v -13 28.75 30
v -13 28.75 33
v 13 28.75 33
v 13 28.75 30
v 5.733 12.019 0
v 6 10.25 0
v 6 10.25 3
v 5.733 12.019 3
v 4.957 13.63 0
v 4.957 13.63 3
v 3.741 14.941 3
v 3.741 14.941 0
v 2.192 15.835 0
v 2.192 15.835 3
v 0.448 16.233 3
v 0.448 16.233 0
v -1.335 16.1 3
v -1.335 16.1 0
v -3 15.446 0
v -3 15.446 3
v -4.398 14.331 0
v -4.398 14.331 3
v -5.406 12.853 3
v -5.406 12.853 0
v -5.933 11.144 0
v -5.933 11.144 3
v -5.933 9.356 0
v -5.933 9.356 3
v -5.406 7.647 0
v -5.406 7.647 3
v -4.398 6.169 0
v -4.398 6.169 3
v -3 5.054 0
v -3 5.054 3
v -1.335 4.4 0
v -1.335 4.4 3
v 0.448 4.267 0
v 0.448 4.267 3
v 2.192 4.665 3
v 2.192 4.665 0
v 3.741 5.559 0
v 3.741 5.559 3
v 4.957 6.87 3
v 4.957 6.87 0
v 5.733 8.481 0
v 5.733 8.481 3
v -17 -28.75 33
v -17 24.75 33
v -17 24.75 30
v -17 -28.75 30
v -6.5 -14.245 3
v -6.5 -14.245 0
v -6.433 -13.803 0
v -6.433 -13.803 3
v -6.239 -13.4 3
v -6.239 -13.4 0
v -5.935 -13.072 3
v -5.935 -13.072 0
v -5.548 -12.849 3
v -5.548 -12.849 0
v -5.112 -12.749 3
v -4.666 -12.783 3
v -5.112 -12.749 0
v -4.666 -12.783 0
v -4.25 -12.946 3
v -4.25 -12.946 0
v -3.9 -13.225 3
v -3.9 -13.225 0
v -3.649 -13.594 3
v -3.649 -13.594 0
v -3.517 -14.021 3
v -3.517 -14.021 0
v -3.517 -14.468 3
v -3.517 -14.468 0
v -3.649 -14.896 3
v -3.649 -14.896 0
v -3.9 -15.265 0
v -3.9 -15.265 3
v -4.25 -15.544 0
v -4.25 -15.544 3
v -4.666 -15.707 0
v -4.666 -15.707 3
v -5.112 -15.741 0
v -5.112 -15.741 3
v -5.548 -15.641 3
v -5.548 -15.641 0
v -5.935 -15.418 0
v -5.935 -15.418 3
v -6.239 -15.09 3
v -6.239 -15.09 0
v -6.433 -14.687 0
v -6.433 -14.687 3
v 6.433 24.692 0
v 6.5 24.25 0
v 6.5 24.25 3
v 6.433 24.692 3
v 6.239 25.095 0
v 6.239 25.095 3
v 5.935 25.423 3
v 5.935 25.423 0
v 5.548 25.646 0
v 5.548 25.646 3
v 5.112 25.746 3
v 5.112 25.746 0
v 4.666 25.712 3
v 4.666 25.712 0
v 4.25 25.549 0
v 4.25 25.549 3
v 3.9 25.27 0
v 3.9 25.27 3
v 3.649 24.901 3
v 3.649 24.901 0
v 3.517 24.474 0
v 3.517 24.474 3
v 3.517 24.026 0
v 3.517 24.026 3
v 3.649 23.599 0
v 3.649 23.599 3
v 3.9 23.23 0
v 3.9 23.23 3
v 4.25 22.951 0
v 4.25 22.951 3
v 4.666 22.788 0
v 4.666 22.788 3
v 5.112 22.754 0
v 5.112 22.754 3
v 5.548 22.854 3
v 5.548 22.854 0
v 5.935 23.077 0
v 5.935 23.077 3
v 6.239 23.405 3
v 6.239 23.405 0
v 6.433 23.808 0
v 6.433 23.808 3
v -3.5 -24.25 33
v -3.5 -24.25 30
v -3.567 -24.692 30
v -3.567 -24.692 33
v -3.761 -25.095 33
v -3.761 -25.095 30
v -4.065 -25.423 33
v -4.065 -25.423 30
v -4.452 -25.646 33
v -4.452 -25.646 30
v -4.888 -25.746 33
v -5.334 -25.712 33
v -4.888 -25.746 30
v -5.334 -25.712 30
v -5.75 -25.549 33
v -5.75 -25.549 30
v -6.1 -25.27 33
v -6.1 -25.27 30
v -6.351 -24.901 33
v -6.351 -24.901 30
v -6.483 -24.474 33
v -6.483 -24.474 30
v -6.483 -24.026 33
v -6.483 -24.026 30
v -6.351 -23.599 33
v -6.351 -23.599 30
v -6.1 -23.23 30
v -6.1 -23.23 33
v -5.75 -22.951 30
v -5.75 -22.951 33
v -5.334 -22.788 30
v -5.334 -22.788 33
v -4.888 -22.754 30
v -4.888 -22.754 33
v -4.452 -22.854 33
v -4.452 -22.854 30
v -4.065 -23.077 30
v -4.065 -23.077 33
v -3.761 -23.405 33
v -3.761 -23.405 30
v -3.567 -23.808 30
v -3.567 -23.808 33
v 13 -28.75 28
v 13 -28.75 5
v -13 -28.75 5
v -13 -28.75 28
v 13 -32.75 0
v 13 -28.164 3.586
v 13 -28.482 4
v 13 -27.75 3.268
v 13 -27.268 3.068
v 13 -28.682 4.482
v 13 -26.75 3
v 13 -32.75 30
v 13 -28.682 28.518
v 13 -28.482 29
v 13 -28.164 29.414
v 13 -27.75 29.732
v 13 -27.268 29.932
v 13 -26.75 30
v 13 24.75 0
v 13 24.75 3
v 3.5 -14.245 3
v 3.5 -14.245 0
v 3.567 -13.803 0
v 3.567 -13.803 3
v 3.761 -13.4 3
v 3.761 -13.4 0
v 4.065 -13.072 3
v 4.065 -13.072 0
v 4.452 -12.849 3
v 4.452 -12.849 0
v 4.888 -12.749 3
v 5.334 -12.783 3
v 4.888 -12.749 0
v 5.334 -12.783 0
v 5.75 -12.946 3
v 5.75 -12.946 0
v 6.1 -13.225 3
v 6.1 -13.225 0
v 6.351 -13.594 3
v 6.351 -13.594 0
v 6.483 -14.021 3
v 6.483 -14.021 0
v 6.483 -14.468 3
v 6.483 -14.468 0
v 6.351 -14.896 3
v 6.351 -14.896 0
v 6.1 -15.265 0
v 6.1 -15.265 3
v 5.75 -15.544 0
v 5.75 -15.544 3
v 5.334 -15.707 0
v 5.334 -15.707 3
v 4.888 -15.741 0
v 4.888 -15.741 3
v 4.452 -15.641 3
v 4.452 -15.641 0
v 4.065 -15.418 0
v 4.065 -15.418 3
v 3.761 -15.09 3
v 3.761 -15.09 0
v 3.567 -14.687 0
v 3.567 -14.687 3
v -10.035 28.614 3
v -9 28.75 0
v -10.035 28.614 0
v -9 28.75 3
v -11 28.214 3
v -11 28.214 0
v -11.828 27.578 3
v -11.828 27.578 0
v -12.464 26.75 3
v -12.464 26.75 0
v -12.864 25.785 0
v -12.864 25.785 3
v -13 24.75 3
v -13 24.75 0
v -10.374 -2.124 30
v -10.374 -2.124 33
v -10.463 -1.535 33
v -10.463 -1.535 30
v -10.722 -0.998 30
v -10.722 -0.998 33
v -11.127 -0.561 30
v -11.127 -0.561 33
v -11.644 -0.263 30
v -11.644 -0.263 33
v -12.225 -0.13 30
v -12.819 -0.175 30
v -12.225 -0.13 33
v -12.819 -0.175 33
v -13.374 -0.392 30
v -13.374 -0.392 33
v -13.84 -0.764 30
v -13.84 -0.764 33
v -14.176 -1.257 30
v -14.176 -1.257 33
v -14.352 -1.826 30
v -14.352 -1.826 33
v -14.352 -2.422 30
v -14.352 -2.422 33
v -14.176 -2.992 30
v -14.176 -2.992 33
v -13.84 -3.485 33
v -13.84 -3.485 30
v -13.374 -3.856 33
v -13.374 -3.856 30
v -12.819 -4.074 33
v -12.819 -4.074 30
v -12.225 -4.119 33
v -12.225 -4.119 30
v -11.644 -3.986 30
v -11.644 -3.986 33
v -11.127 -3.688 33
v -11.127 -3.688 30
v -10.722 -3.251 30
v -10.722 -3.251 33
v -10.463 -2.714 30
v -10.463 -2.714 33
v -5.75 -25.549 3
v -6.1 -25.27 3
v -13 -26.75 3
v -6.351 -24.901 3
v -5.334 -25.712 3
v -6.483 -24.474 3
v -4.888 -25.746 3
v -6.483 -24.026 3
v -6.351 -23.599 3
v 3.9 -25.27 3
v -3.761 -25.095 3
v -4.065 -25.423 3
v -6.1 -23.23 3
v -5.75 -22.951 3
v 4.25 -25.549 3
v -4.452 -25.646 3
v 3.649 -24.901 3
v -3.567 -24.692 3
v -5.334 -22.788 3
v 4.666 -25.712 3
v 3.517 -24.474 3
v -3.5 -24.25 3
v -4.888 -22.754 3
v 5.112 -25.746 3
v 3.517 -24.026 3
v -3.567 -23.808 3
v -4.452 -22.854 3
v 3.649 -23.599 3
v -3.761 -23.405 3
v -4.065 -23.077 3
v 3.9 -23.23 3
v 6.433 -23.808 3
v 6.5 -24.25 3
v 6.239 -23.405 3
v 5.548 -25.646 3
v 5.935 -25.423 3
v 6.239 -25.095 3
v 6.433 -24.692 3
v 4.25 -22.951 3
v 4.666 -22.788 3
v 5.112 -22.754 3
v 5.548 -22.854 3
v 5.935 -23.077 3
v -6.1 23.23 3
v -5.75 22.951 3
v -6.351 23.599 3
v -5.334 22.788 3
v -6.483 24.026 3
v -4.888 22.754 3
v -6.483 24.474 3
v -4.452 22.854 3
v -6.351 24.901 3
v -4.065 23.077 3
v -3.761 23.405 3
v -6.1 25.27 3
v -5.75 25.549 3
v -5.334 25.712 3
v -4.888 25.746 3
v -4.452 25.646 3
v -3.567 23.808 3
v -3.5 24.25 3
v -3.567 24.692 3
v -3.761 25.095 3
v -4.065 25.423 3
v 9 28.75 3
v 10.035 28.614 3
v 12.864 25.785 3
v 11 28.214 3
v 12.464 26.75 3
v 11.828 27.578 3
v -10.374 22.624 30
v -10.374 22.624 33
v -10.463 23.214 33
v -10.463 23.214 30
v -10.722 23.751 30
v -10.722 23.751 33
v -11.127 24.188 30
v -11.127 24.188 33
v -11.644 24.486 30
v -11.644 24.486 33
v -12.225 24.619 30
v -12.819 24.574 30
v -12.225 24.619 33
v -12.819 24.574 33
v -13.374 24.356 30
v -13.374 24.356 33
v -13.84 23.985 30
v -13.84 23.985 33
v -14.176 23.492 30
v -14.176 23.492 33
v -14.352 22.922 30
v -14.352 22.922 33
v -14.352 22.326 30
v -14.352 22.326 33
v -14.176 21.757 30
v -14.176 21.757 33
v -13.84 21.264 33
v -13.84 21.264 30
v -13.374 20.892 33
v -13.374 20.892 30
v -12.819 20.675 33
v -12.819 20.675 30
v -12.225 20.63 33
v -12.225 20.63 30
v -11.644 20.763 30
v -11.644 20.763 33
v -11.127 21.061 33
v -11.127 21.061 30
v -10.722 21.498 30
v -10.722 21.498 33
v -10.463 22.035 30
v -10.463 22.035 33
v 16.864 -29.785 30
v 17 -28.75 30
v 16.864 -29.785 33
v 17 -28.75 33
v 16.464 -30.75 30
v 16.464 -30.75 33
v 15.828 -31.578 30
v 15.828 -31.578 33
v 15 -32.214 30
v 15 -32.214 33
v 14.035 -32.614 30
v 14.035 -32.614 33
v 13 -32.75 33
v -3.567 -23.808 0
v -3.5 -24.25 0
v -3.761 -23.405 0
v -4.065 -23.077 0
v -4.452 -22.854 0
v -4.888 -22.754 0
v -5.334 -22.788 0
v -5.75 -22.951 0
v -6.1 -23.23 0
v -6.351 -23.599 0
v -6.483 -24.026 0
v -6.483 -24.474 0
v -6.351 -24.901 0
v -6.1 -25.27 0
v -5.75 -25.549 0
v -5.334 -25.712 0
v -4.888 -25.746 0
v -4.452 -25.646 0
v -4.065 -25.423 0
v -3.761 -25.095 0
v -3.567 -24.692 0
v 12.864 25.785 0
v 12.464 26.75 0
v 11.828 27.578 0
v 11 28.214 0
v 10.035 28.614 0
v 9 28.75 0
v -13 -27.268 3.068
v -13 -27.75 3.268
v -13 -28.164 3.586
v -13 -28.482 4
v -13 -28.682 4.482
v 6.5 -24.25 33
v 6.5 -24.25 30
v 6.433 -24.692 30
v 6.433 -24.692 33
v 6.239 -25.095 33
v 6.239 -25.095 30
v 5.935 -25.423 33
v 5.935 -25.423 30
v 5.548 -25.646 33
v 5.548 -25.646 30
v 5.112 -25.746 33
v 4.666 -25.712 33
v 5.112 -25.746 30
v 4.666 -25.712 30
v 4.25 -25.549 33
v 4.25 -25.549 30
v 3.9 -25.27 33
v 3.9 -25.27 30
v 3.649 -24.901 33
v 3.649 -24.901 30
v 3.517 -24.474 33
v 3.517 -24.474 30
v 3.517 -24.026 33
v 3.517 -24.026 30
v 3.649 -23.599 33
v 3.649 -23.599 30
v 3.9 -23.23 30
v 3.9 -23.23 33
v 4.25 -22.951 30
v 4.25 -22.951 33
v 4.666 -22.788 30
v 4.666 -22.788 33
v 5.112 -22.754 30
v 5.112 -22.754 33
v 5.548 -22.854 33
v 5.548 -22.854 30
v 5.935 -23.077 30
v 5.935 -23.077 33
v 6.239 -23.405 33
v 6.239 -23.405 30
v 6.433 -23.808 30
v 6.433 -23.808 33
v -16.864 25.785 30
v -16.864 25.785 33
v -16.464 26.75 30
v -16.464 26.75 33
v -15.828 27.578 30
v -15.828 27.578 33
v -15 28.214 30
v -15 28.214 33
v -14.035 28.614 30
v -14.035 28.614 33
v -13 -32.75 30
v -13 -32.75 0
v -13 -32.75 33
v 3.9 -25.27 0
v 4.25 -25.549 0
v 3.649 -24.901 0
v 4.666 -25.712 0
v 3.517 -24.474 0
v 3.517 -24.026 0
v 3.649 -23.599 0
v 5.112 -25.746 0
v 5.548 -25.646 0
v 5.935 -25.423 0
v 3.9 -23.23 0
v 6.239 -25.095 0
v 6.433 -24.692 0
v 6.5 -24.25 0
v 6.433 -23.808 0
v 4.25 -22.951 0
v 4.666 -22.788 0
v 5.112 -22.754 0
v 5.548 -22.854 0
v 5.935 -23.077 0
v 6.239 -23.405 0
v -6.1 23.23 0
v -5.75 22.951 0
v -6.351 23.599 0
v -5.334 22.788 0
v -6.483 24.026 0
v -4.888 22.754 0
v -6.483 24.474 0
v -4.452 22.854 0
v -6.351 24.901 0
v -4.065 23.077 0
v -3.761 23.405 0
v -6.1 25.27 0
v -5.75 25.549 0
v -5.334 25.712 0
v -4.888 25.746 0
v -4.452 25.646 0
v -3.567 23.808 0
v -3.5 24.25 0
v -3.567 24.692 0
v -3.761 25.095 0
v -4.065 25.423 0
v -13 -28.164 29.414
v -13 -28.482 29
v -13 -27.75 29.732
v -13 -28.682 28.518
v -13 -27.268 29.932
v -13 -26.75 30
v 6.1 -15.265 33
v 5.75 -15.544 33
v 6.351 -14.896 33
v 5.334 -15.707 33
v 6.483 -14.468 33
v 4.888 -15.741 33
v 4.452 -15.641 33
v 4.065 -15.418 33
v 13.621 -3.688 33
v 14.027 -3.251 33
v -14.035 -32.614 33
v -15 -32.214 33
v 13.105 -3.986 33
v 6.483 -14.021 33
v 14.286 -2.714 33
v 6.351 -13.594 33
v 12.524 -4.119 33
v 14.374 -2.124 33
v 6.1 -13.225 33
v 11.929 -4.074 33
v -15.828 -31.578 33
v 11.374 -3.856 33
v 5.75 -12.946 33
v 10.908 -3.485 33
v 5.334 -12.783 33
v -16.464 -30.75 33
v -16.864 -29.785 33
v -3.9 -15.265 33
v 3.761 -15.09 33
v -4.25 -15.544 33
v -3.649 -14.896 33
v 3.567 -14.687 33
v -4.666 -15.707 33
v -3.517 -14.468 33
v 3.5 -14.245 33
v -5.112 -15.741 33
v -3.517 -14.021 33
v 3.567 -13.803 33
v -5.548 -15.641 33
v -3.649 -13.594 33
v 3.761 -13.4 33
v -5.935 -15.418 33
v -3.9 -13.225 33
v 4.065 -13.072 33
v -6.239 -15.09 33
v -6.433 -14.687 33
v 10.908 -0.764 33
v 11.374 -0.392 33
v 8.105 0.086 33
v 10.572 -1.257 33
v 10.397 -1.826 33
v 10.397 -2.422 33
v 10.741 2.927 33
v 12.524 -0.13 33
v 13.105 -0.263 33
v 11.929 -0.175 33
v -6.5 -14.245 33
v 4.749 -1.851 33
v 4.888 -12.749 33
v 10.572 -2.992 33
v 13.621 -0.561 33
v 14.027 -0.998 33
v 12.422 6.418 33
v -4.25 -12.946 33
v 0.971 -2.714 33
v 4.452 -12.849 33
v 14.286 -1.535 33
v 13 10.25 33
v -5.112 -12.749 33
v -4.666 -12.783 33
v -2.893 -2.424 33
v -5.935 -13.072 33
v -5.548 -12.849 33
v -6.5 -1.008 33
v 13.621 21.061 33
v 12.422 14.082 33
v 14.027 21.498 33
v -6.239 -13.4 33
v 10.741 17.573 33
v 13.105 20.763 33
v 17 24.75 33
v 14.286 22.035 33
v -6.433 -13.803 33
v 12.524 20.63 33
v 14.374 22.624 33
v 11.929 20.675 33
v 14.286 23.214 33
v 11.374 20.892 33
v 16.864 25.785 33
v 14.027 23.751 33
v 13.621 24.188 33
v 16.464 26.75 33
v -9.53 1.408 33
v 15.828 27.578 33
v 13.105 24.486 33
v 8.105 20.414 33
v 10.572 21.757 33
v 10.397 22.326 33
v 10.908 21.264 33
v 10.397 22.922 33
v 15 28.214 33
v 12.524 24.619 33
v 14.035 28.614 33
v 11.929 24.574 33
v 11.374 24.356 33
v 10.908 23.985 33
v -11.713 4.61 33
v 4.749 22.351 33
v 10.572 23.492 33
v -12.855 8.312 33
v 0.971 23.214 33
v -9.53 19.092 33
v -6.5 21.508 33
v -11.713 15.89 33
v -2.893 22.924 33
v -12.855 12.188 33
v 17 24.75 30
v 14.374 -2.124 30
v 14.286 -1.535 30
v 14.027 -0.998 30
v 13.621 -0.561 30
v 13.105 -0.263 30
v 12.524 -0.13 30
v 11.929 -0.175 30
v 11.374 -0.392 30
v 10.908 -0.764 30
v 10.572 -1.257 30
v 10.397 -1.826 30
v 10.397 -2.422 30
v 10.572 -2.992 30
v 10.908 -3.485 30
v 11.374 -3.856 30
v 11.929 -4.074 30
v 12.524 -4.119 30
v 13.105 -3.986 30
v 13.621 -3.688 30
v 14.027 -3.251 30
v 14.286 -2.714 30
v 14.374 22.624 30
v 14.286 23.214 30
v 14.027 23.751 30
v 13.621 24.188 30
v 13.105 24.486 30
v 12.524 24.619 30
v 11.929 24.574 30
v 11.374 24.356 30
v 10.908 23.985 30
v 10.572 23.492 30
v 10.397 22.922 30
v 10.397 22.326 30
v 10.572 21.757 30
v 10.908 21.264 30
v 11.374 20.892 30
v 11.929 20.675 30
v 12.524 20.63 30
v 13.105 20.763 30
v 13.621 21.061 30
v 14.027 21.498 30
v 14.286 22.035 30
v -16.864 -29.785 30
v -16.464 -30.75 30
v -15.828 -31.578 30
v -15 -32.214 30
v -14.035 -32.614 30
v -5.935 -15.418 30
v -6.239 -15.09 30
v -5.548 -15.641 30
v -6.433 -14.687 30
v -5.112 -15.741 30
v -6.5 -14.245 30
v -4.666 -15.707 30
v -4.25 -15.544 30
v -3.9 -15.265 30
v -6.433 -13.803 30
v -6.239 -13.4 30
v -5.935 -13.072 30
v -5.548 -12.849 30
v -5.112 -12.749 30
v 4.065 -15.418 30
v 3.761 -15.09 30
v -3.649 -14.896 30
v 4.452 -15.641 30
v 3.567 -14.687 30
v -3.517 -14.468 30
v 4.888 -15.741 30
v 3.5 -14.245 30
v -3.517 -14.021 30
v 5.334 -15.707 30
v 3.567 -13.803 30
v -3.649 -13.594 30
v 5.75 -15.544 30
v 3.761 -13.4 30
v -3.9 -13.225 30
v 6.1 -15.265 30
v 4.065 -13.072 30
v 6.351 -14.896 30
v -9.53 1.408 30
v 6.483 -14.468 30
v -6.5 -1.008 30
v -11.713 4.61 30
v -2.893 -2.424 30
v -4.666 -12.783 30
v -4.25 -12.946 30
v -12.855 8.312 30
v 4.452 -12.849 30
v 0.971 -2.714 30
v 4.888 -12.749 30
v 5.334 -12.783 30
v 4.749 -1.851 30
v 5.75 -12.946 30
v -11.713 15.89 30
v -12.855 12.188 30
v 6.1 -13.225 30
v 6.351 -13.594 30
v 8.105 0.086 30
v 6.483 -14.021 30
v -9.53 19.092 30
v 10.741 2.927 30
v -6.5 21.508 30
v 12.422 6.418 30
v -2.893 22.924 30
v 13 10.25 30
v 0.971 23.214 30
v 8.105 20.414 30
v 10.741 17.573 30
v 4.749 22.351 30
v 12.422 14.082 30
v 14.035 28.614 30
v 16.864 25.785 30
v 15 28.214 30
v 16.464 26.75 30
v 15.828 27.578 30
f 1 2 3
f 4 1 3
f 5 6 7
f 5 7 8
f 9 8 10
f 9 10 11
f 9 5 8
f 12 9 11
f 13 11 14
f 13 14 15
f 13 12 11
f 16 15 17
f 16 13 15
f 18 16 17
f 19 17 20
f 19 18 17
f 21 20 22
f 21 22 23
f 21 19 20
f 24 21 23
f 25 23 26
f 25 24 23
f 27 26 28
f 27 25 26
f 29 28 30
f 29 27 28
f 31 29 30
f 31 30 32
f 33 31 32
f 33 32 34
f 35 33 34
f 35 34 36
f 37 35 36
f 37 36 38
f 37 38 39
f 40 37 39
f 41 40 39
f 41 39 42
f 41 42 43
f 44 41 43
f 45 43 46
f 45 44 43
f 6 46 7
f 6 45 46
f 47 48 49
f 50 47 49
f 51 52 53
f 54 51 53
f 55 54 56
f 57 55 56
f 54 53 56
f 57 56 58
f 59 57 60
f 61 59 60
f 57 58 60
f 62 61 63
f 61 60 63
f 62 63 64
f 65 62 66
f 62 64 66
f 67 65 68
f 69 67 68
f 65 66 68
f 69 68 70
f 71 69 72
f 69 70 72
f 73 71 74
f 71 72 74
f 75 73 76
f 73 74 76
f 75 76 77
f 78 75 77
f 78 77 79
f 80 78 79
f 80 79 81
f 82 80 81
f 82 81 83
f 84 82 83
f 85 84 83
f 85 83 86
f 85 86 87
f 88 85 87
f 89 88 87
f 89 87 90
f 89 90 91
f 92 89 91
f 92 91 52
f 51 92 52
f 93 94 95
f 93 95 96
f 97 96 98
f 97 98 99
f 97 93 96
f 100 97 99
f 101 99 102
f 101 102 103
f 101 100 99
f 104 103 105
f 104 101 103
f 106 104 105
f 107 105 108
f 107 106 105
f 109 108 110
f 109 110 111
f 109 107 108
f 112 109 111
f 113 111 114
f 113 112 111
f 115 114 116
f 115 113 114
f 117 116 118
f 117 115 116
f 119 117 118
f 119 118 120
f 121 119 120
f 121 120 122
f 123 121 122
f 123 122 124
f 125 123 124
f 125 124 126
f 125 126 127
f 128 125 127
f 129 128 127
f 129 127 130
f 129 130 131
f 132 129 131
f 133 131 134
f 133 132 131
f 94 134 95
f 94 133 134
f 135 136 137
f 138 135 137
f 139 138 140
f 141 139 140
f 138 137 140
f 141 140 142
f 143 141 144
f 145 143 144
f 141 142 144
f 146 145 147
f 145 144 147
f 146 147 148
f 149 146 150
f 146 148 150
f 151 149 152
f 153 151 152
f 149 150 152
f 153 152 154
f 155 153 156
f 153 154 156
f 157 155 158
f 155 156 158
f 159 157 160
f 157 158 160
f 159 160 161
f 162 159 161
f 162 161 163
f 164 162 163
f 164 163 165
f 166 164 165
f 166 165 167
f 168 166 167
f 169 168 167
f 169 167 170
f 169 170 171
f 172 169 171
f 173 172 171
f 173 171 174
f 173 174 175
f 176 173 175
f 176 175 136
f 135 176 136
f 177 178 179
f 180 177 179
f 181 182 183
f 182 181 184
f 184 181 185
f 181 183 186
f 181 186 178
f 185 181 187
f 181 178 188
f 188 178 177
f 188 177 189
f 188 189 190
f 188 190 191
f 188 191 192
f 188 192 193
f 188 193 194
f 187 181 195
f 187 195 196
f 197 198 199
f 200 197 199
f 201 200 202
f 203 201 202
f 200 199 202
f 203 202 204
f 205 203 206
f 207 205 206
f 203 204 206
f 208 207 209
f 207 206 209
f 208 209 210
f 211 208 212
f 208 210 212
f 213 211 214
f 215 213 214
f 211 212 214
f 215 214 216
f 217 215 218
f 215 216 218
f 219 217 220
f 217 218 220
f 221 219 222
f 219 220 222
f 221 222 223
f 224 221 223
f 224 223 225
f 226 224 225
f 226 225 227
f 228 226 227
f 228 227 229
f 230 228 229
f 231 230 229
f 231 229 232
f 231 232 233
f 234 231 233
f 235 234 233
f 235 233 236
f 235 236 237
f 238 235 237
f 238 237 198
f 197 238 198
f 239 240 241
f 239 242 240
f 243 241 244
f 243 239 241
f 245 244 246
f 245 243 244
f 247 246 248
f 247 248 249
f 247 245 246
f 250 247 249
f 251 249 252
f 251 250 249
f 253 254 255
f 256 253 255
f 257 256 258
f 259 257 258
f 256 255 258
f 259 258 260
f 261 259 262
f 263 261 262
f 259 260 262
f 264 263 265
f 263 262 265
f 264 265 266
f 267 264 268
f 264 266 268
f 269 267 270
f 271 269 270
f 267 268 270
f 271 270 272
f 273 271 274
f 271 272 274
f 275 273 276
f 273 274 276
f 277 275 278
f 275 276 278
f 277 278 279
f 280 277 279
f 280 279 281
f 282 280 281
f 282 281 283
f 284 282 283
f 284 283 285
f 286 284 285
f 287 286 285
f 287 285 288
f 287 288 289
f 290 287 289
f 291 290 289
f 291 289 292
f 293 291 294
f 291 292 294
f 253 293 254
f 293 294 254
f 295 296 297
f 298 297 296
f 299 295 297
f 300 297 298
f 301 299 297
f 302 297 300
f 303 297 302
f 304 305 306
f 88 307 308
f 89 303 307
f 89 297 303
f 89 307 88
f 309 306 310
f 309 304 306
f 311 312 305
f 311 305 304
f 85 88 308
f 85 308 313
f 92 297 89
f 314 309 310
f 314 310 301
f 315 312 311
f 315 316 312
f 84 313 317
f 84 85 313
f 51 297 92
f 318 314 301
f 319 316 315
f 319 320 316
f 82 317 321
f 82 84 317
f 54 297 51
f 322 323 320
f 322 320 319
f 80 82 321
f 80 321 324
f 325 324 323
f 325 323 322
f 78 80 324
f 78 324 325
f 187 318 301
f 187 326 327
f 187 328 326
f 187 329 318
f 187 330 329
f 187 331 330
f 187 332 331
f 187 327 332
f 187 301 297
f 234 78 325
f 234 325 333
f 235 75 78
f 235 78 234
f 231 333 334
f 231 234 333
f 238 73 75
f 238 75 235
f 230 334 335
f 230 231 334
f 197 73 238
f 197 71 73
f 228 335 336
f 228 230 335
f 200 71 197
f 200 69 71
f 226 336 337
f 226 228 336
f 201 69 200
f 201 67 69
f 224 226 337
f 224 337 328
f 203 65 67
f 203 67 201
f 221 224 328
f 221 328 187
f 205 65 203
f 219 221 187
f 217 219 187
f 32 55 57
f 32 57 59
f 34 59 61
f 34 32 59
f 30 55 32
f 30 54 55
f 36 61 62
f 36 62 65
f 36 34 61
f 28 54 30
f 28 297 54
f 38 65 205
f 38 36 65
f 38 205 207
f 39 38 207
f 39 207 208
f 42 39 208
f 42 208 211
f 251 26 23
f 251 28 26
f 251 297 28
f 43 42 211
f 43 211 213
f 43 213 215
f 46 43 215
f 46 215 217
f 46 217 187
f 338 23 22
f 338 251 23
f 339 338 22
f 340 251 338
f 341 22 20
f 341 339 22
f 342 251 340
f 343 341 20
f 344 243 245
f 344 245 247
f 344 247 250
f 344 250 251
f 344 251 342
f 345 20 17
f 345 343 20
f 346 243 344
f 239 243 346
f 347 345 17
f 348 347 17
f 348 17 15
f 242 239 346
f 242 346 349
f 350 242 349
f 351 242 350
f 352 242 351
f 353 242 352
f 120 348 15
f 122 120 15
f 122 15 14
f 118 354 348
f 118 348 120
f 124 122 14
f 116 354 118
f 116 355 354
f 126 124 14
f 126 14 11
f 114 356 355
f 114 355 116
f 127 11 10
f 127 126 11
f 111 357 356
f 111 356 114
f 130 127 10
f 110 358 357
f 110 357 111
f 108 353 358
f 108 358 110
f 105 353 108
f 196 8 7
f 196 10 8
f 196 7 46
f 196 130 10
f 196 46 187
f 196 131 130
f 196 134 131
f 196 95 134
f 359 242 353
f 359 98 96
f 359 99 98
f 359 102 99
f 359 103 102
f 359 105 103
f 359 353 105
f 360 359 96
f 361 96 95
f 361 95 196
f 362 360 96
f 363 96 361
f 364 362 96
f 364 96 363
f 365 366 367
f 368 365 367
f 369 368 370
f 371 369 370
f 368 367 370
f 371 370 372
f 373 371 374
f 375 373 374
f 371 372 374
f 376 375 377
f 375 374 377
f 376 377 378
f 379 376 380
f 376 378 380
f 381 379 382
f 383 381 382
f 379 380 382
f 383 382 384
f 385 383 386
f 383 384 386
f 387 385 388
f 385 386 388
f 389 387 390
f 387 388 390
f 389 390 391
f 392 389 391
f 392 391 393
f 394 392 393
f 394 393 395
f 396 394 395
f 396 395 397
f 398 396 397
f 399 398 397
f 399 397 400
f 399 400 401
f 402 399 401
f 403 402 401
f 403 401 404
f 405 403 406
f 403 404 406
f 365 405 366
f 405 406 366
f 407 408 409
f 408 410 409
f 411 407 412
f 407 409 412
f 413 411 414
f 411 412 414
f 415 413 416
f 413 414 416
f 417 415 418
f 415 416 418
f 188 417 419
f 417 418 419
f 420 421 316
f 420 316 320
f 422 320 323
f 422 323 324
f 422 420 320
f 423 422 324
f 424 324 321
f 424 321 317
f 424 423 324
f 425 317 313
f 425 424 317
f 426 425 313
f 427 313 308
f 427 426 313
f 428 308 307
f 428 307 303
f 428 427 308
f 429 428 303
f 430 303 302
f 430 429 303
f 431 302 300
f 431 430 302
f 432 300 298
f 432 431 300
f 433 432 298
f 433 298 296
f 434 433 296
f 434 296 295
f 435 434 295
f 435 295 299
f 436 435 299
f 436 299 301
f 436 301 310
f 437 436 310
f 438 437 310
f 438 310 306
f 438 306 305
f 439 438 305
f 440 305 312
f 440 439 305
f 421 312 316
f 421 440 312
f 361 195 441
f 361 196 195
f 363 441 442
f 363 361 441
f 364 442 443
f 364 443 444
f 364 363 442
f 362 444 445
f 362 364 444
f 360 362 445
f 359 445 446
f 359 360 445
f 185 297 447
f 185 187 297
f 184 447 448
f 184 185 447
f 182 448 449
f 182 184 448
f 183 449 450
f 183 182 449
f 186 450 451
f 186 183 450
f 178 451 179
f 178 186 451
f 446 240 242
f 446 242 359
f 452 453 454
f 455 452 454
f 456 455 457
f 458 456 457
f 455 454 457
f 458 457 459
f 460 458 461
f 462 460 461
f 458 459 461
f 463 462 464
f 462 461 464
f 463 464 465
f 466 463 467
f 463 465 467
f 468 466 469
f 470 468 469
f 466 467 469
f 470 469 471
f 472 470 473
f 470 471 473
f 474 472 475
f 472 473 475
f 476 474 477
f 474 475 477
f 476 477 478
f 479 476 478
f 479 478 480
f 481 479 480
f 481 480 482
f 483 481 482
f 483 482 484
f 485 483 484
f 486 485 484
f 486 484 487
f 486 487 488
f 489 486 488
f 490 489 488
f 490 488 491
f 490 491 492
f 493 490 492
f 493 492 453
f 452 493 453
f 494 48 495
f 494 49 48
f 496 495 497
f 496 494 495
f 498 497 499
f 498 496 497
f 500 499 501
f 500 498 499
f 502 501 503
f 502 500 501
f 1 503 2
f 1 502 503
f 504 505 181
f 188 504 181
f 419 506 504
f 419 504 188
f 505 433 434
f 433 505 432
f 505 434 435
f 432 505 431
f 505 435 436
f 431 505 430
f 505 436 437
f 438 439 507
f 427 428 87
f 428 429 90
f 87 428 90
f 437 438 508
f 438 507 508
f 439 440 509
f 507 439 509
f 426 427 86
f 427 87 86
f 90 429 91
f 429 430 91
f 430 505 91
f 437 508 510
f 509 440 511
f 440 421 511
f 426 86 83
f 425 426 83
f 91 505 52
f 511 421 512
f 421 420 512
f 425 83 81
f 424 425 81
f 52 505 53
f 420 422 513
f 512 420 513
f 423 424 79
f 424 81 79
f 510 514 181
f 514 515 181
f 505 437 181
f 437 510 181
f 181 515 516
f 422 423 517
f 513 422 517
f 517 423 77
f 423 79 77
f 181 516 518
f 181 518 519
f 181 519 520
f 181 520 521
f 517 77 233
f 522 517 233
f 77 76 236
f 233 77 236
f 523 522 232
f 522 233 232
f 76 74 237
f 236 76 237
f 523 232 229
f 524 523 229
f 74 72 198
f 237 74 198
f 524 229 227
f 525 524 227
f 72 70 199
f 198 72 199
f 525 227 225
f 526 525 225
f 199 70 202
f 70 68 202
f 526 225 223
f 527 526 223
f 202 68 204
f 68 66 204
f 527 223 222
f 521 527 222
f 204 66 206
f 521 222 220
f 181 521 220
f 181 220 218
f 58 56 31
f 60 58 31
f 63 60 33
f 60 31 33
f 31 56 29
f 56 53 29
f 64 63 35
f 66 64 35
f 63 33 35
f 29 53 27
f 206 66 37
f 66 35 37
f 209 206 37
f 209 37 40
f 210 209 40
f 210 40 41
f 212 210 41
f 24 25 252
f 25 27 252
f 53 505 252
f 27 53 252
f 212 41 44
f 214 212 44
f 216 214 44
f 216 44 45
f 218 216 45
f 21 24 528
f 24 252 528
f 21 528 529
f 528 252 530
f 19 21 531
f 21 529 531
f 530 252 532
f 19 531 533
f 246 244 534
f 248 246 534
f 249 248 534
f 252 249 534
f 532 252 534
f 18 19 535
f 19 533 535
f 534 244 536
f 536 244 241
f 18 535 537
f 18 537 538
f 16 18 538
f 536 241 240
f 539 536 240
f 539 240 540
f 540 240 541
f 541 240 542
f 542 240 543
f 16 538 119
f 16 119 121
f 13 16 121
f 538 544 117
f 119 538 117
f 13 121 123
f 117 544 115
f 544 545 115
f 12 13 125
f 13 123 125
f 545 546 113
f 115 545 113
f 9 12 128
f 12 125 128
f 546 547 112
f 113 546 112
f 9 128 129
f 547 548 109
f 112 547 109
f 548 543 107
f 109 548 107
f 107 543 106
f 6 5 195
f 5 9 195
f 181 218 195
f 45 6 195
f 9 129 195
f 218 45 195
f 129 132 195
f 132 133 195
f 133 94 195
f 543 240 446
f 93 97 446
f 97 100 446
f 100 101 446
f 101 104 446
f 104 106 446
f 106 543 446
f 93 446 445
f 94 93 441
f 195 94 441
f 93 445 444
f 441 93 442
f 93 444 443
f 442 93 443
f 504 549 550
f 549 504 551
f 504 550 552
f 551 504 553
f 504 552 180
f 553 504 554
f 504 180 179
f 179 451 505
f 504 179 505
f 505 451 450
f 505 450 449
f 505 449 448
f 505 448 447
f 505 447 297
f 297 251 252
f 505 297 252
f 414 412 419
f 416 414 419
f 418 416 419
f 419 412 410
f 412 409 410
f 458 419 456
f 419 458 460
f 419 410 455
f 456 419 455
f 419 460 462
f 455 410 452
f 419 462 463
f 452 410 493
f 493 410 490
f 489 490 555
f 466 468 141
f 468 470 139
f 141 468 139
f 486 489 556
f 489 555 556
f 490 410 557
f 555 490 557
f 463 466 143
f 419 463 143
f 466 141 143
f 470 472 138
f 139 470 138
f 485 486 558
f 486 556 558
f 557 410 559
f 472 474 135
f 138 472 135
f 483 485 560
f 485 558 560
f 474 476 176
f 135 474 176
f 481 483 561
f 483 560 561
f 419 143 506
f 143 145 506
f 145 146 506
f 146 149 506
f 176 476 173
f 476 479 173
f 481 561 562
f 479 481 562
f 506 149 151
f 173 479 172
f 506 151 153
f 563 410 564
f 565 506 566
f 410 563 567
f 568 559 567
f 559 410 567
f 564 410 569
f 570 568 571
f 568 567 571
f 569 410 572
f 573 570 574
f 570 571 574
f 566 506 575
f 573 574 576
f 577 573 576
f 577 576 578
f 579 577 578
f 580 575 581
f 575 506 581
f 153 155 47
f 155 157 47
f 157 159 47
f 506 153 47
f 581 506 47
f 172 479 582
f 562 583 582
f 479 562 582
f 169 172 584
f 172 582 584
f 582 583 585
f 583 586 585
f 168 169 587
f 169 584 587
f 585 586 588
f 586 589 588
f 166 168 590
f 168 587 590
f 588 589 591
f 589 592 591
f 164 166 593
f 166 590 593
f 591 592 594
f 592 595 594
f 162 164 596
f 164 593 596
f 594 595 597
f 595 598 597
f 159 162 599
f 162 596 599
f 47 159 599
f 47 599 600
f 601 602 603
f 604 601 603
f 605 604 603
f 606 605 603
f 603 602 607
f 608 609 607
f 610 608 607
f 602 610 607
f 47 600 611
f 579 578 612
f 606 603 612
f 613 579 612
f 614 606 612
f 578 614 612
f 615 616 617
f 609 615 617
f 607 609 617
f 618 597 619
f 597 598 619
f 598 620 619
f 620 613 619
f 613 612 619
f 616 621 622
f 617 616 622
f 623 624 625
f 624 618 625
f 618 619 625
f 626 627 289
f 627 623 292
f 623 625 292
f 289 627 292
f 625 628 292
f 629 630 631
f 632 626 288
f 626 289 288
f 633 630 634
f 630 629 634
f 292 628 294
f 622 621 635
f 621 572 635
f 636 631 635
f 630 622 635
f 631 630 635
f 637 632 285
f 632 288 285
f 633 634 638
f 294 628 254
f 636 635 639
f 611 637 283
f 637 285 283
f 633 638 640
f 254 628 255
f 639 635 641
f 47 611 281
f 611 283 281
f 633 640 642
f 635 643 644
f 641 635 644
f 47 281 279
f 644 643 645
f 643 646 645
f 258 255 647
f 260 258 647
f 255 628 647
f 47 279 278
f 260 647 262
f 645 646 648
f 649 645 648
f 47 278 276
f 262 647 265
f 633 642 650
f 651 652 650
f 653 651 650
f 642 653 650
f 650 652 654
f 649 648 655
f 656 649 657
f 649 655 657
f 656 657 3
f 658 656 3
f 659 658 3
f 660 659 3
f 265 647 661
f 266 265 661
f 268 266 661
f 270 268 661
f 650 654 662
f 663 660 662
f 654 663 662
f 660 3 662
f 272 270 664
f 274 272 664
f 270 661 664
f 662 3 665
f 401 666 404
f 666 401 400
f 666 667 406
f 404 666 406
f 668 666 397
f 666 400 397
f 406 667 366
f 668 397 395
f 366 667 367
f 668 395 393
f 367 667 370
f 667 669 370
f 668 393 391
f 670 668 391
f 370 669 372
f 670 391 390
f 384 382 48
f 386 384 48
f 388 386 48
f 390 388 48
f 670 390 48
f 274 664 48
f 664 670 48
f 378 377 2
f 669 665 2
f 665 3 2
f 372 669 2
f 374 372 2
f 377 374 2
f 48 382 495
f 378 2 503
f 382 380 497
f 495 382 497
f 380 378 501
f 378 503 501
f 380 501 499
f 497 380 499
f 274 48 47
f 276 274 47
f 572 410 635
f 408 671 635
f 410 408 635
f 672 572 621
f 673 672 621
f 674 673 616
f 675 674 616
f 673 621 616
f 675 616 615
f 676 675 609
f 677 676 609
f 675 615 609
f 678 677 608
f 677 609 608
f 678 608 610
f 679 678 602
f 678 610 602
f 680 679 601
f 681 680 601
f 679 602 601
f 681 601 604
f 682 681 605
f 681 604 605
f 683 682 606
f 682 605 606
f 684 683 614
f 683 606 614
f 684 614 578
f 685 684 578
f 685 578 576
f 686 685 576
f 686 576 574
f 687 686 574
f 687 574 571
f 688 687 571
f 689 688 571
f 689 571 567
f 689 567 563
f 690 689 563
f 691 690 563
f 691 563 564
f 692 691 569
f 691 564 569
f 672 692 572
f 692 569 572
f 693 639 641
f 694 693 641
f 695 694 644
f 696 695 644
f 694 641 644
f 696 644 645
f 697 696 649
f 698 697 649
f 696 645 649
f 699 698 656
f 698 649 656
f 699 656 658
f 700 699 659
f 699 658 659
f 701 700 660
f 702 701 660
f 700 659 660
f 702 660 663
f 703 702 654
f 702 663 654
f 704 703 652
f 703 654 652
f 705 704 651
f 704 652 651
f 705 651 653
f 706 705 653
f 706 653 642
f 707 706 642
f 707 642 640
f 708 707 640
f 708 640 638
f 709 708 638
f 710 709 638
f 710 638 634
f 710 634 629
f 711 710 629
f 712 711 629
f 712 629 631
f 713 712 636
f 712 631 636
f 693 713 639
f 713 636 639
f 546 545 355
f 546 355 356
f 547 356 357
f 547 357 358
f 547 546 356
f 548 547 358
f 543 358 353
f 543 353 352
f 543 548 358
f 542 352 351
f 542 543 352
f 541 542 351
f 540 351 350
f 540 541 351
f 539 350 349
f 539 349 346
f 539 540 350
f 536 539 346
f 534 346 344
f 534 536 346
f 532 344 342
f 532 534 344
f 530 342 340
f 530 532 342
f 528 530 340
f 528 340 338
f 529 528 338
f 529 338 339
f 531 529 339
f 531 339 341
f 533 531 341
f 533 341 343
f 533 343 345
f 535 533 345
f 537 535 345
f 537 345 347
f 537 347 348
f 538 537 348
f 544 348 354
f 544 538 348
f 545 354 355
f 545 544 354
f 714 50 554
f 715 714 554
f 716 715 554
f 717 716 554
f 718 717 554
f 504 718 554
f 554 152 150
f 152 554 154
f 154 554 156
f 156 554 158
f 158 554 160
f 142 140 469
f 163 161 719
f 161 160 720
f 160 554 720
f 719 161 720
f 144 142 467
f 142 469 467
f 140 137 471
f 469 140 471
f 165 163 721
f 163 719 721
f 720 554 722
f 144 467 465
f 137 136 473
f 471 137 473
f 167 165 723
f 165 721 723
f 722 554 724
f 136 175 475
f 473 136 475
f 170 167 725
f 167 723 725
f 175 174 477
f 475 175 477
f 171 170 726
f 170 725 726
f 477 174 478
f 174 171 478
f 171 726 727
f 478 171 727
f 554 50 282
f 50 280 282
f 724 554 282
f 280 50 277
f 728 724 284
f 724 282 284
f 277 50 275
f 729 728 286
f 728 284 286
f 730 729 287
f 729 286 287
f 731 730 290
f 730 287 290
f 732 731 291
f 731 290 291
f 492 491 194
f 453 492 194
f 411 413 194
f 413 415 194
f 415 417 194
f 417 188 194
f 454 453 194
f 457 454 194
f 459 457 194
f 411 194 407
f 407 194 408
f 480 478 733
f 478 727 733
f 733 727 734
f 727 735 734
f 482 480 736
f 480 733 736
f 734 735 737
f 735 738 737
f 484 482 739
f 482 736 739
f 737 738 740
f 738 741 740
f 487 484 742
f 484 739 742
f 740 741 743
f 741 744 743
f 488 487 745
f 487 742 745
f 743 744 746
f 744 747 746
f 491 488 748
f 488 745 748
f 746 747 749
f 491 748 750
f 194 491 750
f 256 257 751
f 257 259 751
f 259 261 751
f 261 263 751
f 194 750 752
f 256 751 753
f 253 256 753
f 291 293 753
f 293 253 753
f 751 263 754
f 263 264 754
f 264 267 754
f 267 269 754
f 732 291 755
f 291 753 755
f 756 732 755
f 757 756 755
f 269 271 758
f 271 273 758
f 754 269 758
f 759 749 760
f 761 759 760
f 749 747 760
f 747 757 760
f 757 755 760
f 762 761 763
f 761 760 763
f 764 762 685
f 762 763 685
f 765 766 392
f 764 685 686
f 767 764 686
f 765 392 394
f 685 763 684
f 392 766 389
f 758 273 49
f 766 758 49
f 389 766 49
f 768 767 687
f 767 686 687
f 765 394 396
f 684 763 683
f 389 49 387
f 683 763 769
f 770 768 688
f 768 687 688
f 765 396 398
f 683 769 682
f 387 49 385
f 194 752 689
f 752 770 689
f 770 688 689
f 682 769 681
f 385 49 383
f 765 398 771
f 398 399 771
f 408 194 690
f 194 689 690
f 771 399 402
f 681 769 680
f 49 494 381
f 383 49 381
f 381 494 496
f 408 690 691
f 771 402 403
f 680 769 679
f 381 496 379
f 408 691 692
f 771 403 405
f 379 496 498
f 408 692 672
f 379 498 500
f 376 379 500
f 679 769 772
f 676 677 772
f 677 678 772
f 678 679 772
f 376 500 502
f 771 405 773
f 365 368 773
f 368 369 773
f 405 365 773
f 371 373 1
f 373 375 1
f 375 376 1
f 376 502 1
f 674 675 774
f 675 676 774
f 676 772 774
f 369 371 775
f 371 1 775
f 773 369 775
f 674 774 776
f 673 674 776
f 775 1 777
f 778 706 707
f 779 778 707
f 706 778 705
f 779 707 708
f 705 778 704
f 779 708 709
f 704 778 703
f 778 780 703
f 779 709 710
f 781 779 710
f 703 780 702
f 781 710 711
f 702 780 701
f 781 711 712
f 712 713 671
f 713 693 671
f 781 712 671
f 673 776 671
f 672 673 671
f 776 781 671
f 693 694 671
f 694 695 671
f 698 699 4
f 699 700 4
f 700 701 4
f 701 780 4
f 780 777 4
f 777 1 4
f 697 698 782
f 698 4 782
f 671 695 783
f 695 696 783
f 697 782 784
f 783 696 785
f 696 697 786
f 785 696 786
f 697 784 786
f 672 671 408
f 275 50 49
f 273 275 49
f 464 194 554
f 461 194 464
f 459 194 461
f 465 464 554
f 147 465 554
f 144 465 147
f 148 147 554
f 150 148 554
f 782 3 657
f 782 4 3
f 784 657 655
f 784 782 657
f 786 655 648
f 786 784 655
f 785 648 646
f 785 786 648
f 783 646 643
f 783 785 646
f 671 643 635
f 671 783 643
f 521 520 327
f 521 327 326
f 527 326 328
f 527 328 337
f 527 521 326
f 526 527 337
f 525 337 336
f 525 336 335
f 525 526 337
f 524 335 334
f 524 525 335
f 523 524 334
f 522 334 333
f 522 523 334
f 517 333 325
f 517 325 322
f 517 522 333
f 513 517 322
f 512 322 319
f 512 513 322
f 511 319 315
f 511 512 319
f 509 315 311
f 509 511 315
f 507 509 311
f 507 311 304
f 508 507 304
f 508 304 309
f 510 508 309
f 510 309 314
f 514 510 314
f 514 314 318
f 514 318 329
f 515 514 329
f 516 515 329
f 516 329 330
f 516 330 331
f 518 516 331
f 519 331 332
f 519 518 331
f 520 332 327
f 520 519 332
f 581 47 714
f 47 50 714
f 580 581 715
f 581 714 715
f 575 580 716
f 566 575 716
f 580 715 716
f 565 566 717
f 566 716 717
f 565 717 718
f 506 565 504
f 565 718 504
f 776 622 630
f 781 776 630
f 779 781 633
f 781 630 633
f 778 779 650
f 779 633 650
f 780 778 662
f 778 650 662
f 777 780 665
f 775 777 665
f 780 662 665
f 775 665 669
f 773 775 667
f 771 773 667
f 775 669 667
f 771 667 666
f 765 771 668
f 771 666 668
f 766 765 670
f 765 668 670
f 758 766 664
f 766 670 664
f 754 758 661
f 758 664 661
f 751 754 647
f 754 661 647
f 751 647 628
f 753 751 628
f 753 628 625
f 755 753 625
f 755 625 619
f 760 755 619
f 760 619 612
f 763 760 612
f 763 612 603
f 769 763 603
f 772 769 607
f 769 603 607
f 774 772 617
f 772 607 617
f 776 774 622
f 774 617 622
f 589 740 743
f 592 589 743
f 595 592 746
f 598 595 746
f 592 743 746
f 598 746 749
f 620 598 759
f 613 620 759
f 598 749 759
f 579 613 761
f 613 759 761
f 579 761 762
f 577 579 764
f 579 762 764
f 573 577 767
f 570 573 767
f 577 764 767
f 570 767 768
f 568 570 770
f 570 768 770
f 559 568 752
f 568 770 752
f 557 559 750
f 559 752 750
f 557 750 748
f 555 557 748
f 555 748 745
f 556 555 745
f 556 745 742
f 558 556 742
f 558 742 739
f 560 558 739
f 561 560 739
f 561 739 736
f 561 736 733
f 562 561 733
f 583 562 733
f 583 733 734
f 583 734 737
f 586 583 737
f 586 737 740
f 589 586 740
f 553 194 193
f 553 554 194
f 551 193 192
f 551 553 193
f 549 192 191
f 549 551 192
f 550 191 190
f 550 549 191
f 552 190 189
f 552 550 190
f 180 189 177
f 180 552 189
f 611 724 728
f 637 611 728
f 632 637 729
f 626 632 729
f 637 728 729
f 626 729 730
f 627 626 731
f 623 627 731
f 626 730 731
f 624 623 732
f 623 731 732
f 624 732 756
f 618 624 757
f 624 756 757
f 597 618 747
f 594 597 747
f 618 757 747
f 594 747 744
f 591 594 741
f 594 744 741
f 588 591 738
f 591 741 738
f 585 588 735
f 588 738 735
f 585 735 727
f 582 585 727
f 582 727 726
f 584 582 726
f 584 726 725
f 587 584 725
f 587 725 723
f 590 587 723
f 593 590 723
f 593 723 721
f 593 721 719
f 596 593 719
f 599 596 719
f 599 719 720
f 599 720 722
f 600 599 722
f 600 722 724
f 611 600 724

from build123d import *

# Parameters (mm, degrees)
SKETCH_1_W          = 26
SKETCH_1_H          = 57.5
SKETCH_1_R          = 1.5
SKETCH_1_R_2        = 6
EXTRUDE_1_DEPTH     = 3
SKETCH_2_W          = 26
SKETCH_2_H          = 3
EXTRUDE_2_DEPTH     = 33
SKETCH_3_W          = 34
SKETCH_3_H          = 60.5
SKETCH_3_R          = 2
SKETCH_3_R_2        = 13
EXTRUDE_3_DEPTH     = 3
FILLET_1_R          = 2
EXTRUDE_4_DEPTH     = 1
FILLET_2_R          = 4
SKETCH_5_R          = 1.5
CUT_EXTRUDE_1_DEPTH = 50.503156465


with BuildPart() as part:
    # 草图1 → 凸台-拉伸1 (new body)
    with BuildSketch(Plane.XY):
        Rectangle(SKETCH_1_W, SKETCH_1_H)
        with Locations((-5, 24.25)):
            Circle(SKETCH_1_R, mode=Mode.SUBTRACT)
        with Locations((5, 24.25)):
            Circle(SKETCH_1_R, mode=Mode.SUBTRACT)
        with Locations((5, -24.25)):
            Circle(SKETCH_1_R, mode=Mode.SUBTRACT)
        with Locations((-5, -24.25)):
            Circle(SKETCH_1_R, mode=Mode.SUBTRACT)
        with Locations((0, 10.25)):
            Circle(SKETCH_1_R_2, mode=Mode.SUBTRACT)
    extrude(amount=EXTRUDE_1_DEPTH)

    # 草图2 → 凸台-拉伸2 (add)
    with BuildSketch(Plane(origin=(0, 0, 0), x_dir=(-1, 0, 0), z_dir=(0, 0, -1))):
        with Locations((0, -30.25)):
            Rectangle(SKETCH_2_W, SKETCH_2_H)
    extrude(amount=-EXTRUDE_2_DEPTH)

    # 草图3 → 凸台-拉伸3 (add)
    with BuildSketch(Plane.XY.offset(33)):
        with Locations((0, -1.5)):
            Rectangle(SKETCH_3_W, SKETCH_3_H)
        with Locations((12.374368671, 22.624368671)):
            Circle(SKETCH_3_R, mode=Mode.SUBTRACT)
        with Locations((12.374368671, -2.124368671)):
            Circle(SKETCH_3_R, mode=Mode.SUBTRACT)
        with Locations((-12.374368671, -2.124368671)):
            Circle(SKETCH_3_R, mode=Mode.SUBTRACT)
        with Locations((-12.374368671, 22.624368671)):
            Circle(SKETCH_3_R, mode=Mode.SUBTRACT)
        with Locations((0, 10.25)):
            Circle(SKETCH_3_R_2, mode=Mode.SUBTRACT)
    extrude(amount=-EXTRUDE_3_DEPTH)

    # 圆角1
    fillet_1_edges = [part.edges().sort_by_distance(p)[0] for p in [
        (0, -28.75, 3),
        (0, -28.75, 30),
    ]]
    fillet(fillet_1_edges, radius=FILLET_1_R)

    # 草图4 → 凸台-拉伸4 (add)
    with BuildSketch(Plane.XZ.offset(31.75)):
        Polygon((13, 0), (13, 30), (17, 30), (17, 33), (-17, 33), (-17, 30), (-13, 30), (-13, 0), align=None)
    extrude(amount=EXTRUDE_4_DEPTH)

    # 圆角2
    fillet_2_edges = [part.edges().sort_by_distance(p)[0] for p in [
        (-13, 28.75, 1.5),
        (13, 28.75, 1.5),
        (-17, 28.75, 31.5),
        (17, 28.75, 31.5),
        (17, -32.75, 31.5),
        (-17, -32.75, 31.5),
    ]]
    fillet(fillet_2_edges, radius=FILLET_2_R)

    # 草图5 → 切除-拉伸1 (cut, through all)
    with BuildSketch(Plane(origin=(0, 0, 0), x_dir=(-1, 0, 0), z_dir=(0, 0, -1))):
        with Locations(Location((-5, -24.25, 0), (0, 0, 180))):
            Circle(SKETCH_5_R)
        with Locations(Location((5, -24.25, 0), (0, 0, 180))):
            Circle(SKETCH_5_R)
        with Locations((-5, -14.244897428)):
            Circle(SKETCH_5_R)
        with Locations((5, -14.244897428)):
            Circle(SKETCH_5_R)
    extrude(amount=-CUT_EXTRUDE_1_DEPTH, mode=Mode.SUBTRACT)


solid = part.part
